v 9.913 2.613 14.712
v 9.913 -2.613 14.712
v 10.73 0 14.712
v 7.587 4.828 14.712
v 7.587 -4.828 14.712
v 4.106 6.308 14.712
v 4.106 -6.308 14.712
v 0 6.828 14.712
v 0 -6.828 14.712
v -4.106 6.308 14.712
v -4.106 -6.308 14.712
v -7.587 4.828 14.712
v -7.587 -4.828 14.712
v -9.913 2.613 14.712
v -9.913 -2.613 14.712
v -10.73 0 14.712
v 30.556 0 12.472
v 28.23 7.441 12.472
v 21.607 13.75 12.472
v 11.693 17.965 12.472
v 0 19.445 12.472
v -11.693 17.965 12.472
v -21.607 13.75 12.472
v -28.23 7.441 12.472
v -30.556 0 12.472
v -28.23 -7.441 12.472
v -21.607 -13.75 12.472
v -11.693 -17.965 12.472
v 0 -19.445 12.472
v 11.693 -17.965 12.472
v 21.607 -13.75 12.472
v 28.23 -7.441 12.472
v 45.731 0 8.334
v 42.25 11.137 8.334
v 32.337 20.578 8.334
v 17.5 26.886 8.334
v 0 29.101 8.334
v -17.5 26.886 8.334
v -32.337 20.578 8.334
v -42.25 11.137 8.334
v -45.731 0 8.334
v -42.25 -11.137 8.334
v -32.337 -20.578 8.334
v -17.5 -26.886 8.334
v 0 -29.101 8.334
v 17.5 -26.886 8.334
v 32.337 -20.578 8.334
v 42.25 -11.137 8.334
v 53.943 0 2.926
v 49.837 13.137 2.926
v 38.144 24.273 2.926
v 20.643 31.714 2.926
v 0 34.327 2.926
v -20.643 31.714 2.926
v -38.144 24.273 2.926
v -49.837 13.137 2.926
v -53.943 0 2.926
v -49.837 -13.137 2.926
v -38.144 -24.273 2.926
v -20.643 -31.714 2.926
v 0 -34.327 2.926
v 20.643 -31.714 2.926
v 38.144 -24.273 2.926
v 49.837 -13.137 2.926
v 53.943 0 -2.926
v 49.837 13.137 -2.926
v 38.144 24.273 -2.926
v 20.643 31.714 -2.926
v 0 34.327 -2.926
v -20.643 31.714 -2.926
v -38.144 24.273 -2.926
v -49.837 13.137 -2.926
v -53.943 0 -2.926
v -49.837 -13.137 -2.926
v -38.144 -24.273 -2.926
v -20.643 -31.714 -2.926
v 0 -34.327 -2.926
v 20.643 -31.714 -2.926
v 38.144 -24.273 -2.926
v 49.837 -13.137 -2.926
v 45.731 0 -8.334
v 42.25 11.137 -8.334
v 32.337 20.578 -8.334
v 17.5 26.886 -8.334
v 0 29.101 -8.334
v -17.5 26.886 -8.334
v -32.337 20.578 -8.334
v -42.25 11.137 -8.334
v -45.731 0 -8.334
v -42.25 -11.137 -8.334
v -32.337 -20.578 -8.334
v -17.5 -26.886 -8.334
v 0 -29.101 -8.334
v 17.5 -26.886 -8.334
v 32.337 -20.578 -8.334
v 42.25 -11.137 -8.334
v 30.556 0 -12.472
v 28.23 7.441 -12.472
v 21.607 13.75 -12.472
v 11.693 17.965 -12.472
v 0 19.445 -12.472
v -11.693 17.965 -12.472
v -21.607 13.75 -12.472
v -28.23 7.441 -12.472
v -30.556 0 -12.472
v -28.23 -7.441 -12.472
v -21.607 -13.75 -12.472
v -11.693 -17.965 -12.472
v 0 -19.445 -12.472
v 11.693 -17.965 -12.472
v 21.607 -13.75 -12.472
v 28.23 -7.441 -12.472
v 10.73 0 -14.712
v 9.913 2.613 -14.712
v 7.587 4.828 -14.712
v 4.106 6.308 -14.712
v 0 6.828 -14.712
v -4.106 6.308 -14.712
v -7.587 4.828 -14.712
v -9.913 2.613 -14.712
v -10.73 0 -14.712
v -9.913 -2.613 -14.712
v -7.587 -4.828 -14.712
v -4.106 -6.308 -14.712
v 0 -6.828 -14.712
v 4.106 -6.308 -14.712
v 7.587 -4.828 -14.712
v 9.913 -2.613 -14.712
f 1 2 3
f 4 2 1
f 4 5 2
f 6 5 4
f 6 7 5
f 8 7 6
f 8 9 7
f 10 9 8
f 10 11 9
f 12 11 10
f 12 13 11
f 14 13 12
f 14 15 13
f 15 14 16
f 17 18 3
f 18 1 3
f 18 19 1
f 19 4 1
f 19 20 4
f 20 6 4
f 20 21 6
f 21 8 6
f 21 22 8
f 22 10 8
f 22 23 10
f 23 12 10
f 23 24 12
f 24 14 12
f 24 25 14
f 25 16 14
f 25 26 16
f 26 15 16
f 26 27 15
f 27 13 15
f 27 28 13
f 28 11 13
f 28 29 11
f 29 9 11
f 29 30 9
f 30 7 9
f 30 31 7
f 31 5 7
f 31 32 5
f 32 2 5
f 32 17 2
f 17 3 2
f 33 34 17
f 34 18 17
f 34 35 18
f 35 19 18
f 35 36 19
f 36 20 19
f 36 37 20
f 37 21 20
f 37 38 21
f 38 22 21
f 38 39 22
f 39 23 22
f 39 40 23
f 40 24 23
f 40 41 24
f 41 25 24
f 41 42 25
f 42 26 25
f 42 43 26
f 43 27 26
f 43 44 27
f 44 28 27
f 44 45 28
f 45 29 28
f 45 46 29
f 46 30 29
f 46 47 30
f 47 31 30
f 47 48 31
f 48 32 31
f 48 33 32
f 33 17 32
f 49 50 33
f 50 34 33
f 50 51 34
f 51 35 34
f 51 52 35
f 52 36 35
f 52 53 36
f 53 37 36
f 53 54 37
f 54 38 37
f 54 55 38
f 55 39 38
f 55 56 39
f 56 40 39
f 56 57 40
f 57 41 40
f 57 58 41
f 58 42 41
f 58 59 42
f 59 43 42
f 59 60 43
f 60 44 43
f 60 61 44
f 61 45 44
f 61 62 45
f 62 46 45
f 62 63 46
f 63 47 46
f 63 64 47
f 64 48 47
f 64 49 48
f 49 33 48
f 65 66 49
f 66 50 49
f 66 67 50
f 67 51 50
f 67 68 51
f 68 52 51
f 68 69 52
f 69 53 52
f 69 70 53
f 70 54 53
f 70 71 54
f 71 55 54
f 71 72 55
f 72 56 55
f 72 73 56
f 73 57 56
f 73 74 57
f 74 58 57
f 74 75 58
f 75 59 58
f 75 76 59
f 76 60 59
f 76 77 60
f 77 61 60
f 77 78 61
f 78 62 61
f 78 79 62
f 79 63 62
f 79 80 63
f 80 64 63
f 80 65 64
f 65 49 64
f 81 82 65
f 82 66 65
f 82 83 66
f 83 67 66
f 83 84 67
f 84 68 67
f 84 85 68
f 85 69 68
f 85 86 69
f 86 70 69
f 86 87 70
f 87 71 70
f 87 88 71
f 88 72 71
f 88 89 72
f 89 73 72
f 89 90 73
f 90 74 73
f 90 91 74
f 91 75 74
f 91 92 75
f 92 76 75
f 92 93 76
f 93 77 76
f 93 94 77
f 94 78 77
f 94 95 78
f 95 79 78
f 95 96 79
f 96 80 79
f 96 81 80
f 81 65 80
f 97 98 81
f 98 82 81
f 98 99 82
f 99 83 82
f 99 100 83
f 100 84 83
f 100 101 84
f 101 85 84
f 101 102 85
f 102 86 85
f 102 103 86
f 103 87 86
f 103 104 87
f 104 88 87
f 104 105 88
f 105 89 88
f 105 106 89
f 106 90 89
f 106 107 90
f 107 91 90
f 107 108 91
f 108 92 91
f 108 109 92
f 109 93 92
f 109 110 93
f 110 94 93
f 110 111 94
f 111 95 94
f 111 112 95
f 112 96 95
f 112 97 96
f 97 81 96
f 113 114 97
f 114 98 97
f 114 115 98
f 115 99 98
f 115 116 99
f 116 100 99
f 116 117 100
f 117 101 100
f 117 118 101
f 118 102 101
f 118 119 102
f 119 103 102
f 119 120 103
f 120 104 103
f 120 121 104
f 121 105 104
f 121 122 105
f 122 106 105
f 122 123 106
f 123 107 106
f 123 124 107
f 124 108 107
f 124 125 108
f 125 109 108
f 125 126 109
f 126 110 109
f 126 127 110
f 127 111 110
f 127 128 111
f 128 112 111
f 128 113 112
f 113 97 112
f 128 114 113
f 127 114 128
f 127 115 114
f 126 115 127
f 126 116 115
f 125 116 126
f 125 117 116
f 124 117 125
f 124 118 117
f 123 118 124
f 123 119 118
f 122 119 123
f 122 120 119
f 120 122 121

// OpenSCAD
// Generated by SolidPython 1.0.1 on 2020-07-29 00:46:49


scale(v = [11, 7, 3]) {
	sphere(r = 5);
}
/***********************************************
*********      SolidPython code:      **********
************************************************
 
# import packages: SolidPython
from solid import *
from solid.utils import *
from itertools import chain, combinations, permutations


class Resize:

    def __init__(self, scad_file):
        self.scad_file = scad_file
        #self.scad_file = import_scad(scad_file)
        # cone/cylinder param:
        self.r1 = 0
        self.r2 = 0
        self.h = 0
        # rectangular prism param:
        self.w = 0
        self.l = 0
        # ellipse param:
        self.r = 0

    # import OpenScad code (file name corresponds to shape)


    # classify shape + parameters
    def assign(self, param1, param2, param3):
        if self.scad_file == 'cone.scad':
            self.r1 = param1
            self.r2 = param2
            self.h = param3
        elif self.scad_file == 'cylinder.scad':
            self.r1 = param1
            self.r2 = param2
            self.h = param3
        elif self.scad_file == 'rectangularPrism.scad':
            self.h = param1
            self.l = param2
            self.w = param3
        else:
            self.r = param1
            self.h = param2

    # resize parameters
    def iterate(self):
        x = range(3, 20, 2)
        i = 1
        if self.scad_file == 'cone.scad':
            tempList = list(permutations(x, 2))
            for temp in tempList:
                param1 = temp[0]
                param2 = temp[1]
                filepath = 'produced_scad_files/' + 'cone' + str(param1) + '_' + str(param2) + '_' + '.scad'
                scad_render_to_file(cylinder(h=param1, r1=param2, r2=0), filepath)

        elif self.scad_file == 'cylinder.scad':
            tempList = list(permutations(x, 3))
            for temp in tempList:
                param1 = temp[0]
                param2 = temp[1]
                filepath = 'produced_scad_files/' + 'cylinder' + str(param1) + '_' + str(param2) + '_' + '.scad'
                scad_render_to_file(cylinder(h=param1, r1=param2, r2=param2), filepath)

        elif self.scad_file == 'rectangularPrism.scad':
            tempList = list(permutations(x, 3))
            for temp in tempList:
                param1 = temp[0]
                param2 = temp[1]
                param3 = temp[2]
                filepath = 'produced_scad_files/' + 'rectangularPrism' + str(param1) + '_' + str(param2) + '_' + str(
                    param3) + '.scad'
                scad_render_to_file(cube(size=(param1, param2, param3)), filepath)

        elif self.scad_file == 'ellipse.scad':
            tempList = list(permutations(x, 4))
            for temp in tempList:
                param1 = temp[0]
                param2 = temp[1]
                param3 = temp[2]
                param4 = temp[3]
                filepath = 'produced_scad_files/' + 'ellipse' + str(param1) + '_' + str(param2) + '_' + str(param3) + '_' + str(param4) + '.scad'
                scad_render_to_file(scale([param1, param2, param3])(sphere(r=param4)), filepath)

    def render_to_scadfile(self):
        scad_render_to_file(scad, 'example.scad') 
 
************************************************/
